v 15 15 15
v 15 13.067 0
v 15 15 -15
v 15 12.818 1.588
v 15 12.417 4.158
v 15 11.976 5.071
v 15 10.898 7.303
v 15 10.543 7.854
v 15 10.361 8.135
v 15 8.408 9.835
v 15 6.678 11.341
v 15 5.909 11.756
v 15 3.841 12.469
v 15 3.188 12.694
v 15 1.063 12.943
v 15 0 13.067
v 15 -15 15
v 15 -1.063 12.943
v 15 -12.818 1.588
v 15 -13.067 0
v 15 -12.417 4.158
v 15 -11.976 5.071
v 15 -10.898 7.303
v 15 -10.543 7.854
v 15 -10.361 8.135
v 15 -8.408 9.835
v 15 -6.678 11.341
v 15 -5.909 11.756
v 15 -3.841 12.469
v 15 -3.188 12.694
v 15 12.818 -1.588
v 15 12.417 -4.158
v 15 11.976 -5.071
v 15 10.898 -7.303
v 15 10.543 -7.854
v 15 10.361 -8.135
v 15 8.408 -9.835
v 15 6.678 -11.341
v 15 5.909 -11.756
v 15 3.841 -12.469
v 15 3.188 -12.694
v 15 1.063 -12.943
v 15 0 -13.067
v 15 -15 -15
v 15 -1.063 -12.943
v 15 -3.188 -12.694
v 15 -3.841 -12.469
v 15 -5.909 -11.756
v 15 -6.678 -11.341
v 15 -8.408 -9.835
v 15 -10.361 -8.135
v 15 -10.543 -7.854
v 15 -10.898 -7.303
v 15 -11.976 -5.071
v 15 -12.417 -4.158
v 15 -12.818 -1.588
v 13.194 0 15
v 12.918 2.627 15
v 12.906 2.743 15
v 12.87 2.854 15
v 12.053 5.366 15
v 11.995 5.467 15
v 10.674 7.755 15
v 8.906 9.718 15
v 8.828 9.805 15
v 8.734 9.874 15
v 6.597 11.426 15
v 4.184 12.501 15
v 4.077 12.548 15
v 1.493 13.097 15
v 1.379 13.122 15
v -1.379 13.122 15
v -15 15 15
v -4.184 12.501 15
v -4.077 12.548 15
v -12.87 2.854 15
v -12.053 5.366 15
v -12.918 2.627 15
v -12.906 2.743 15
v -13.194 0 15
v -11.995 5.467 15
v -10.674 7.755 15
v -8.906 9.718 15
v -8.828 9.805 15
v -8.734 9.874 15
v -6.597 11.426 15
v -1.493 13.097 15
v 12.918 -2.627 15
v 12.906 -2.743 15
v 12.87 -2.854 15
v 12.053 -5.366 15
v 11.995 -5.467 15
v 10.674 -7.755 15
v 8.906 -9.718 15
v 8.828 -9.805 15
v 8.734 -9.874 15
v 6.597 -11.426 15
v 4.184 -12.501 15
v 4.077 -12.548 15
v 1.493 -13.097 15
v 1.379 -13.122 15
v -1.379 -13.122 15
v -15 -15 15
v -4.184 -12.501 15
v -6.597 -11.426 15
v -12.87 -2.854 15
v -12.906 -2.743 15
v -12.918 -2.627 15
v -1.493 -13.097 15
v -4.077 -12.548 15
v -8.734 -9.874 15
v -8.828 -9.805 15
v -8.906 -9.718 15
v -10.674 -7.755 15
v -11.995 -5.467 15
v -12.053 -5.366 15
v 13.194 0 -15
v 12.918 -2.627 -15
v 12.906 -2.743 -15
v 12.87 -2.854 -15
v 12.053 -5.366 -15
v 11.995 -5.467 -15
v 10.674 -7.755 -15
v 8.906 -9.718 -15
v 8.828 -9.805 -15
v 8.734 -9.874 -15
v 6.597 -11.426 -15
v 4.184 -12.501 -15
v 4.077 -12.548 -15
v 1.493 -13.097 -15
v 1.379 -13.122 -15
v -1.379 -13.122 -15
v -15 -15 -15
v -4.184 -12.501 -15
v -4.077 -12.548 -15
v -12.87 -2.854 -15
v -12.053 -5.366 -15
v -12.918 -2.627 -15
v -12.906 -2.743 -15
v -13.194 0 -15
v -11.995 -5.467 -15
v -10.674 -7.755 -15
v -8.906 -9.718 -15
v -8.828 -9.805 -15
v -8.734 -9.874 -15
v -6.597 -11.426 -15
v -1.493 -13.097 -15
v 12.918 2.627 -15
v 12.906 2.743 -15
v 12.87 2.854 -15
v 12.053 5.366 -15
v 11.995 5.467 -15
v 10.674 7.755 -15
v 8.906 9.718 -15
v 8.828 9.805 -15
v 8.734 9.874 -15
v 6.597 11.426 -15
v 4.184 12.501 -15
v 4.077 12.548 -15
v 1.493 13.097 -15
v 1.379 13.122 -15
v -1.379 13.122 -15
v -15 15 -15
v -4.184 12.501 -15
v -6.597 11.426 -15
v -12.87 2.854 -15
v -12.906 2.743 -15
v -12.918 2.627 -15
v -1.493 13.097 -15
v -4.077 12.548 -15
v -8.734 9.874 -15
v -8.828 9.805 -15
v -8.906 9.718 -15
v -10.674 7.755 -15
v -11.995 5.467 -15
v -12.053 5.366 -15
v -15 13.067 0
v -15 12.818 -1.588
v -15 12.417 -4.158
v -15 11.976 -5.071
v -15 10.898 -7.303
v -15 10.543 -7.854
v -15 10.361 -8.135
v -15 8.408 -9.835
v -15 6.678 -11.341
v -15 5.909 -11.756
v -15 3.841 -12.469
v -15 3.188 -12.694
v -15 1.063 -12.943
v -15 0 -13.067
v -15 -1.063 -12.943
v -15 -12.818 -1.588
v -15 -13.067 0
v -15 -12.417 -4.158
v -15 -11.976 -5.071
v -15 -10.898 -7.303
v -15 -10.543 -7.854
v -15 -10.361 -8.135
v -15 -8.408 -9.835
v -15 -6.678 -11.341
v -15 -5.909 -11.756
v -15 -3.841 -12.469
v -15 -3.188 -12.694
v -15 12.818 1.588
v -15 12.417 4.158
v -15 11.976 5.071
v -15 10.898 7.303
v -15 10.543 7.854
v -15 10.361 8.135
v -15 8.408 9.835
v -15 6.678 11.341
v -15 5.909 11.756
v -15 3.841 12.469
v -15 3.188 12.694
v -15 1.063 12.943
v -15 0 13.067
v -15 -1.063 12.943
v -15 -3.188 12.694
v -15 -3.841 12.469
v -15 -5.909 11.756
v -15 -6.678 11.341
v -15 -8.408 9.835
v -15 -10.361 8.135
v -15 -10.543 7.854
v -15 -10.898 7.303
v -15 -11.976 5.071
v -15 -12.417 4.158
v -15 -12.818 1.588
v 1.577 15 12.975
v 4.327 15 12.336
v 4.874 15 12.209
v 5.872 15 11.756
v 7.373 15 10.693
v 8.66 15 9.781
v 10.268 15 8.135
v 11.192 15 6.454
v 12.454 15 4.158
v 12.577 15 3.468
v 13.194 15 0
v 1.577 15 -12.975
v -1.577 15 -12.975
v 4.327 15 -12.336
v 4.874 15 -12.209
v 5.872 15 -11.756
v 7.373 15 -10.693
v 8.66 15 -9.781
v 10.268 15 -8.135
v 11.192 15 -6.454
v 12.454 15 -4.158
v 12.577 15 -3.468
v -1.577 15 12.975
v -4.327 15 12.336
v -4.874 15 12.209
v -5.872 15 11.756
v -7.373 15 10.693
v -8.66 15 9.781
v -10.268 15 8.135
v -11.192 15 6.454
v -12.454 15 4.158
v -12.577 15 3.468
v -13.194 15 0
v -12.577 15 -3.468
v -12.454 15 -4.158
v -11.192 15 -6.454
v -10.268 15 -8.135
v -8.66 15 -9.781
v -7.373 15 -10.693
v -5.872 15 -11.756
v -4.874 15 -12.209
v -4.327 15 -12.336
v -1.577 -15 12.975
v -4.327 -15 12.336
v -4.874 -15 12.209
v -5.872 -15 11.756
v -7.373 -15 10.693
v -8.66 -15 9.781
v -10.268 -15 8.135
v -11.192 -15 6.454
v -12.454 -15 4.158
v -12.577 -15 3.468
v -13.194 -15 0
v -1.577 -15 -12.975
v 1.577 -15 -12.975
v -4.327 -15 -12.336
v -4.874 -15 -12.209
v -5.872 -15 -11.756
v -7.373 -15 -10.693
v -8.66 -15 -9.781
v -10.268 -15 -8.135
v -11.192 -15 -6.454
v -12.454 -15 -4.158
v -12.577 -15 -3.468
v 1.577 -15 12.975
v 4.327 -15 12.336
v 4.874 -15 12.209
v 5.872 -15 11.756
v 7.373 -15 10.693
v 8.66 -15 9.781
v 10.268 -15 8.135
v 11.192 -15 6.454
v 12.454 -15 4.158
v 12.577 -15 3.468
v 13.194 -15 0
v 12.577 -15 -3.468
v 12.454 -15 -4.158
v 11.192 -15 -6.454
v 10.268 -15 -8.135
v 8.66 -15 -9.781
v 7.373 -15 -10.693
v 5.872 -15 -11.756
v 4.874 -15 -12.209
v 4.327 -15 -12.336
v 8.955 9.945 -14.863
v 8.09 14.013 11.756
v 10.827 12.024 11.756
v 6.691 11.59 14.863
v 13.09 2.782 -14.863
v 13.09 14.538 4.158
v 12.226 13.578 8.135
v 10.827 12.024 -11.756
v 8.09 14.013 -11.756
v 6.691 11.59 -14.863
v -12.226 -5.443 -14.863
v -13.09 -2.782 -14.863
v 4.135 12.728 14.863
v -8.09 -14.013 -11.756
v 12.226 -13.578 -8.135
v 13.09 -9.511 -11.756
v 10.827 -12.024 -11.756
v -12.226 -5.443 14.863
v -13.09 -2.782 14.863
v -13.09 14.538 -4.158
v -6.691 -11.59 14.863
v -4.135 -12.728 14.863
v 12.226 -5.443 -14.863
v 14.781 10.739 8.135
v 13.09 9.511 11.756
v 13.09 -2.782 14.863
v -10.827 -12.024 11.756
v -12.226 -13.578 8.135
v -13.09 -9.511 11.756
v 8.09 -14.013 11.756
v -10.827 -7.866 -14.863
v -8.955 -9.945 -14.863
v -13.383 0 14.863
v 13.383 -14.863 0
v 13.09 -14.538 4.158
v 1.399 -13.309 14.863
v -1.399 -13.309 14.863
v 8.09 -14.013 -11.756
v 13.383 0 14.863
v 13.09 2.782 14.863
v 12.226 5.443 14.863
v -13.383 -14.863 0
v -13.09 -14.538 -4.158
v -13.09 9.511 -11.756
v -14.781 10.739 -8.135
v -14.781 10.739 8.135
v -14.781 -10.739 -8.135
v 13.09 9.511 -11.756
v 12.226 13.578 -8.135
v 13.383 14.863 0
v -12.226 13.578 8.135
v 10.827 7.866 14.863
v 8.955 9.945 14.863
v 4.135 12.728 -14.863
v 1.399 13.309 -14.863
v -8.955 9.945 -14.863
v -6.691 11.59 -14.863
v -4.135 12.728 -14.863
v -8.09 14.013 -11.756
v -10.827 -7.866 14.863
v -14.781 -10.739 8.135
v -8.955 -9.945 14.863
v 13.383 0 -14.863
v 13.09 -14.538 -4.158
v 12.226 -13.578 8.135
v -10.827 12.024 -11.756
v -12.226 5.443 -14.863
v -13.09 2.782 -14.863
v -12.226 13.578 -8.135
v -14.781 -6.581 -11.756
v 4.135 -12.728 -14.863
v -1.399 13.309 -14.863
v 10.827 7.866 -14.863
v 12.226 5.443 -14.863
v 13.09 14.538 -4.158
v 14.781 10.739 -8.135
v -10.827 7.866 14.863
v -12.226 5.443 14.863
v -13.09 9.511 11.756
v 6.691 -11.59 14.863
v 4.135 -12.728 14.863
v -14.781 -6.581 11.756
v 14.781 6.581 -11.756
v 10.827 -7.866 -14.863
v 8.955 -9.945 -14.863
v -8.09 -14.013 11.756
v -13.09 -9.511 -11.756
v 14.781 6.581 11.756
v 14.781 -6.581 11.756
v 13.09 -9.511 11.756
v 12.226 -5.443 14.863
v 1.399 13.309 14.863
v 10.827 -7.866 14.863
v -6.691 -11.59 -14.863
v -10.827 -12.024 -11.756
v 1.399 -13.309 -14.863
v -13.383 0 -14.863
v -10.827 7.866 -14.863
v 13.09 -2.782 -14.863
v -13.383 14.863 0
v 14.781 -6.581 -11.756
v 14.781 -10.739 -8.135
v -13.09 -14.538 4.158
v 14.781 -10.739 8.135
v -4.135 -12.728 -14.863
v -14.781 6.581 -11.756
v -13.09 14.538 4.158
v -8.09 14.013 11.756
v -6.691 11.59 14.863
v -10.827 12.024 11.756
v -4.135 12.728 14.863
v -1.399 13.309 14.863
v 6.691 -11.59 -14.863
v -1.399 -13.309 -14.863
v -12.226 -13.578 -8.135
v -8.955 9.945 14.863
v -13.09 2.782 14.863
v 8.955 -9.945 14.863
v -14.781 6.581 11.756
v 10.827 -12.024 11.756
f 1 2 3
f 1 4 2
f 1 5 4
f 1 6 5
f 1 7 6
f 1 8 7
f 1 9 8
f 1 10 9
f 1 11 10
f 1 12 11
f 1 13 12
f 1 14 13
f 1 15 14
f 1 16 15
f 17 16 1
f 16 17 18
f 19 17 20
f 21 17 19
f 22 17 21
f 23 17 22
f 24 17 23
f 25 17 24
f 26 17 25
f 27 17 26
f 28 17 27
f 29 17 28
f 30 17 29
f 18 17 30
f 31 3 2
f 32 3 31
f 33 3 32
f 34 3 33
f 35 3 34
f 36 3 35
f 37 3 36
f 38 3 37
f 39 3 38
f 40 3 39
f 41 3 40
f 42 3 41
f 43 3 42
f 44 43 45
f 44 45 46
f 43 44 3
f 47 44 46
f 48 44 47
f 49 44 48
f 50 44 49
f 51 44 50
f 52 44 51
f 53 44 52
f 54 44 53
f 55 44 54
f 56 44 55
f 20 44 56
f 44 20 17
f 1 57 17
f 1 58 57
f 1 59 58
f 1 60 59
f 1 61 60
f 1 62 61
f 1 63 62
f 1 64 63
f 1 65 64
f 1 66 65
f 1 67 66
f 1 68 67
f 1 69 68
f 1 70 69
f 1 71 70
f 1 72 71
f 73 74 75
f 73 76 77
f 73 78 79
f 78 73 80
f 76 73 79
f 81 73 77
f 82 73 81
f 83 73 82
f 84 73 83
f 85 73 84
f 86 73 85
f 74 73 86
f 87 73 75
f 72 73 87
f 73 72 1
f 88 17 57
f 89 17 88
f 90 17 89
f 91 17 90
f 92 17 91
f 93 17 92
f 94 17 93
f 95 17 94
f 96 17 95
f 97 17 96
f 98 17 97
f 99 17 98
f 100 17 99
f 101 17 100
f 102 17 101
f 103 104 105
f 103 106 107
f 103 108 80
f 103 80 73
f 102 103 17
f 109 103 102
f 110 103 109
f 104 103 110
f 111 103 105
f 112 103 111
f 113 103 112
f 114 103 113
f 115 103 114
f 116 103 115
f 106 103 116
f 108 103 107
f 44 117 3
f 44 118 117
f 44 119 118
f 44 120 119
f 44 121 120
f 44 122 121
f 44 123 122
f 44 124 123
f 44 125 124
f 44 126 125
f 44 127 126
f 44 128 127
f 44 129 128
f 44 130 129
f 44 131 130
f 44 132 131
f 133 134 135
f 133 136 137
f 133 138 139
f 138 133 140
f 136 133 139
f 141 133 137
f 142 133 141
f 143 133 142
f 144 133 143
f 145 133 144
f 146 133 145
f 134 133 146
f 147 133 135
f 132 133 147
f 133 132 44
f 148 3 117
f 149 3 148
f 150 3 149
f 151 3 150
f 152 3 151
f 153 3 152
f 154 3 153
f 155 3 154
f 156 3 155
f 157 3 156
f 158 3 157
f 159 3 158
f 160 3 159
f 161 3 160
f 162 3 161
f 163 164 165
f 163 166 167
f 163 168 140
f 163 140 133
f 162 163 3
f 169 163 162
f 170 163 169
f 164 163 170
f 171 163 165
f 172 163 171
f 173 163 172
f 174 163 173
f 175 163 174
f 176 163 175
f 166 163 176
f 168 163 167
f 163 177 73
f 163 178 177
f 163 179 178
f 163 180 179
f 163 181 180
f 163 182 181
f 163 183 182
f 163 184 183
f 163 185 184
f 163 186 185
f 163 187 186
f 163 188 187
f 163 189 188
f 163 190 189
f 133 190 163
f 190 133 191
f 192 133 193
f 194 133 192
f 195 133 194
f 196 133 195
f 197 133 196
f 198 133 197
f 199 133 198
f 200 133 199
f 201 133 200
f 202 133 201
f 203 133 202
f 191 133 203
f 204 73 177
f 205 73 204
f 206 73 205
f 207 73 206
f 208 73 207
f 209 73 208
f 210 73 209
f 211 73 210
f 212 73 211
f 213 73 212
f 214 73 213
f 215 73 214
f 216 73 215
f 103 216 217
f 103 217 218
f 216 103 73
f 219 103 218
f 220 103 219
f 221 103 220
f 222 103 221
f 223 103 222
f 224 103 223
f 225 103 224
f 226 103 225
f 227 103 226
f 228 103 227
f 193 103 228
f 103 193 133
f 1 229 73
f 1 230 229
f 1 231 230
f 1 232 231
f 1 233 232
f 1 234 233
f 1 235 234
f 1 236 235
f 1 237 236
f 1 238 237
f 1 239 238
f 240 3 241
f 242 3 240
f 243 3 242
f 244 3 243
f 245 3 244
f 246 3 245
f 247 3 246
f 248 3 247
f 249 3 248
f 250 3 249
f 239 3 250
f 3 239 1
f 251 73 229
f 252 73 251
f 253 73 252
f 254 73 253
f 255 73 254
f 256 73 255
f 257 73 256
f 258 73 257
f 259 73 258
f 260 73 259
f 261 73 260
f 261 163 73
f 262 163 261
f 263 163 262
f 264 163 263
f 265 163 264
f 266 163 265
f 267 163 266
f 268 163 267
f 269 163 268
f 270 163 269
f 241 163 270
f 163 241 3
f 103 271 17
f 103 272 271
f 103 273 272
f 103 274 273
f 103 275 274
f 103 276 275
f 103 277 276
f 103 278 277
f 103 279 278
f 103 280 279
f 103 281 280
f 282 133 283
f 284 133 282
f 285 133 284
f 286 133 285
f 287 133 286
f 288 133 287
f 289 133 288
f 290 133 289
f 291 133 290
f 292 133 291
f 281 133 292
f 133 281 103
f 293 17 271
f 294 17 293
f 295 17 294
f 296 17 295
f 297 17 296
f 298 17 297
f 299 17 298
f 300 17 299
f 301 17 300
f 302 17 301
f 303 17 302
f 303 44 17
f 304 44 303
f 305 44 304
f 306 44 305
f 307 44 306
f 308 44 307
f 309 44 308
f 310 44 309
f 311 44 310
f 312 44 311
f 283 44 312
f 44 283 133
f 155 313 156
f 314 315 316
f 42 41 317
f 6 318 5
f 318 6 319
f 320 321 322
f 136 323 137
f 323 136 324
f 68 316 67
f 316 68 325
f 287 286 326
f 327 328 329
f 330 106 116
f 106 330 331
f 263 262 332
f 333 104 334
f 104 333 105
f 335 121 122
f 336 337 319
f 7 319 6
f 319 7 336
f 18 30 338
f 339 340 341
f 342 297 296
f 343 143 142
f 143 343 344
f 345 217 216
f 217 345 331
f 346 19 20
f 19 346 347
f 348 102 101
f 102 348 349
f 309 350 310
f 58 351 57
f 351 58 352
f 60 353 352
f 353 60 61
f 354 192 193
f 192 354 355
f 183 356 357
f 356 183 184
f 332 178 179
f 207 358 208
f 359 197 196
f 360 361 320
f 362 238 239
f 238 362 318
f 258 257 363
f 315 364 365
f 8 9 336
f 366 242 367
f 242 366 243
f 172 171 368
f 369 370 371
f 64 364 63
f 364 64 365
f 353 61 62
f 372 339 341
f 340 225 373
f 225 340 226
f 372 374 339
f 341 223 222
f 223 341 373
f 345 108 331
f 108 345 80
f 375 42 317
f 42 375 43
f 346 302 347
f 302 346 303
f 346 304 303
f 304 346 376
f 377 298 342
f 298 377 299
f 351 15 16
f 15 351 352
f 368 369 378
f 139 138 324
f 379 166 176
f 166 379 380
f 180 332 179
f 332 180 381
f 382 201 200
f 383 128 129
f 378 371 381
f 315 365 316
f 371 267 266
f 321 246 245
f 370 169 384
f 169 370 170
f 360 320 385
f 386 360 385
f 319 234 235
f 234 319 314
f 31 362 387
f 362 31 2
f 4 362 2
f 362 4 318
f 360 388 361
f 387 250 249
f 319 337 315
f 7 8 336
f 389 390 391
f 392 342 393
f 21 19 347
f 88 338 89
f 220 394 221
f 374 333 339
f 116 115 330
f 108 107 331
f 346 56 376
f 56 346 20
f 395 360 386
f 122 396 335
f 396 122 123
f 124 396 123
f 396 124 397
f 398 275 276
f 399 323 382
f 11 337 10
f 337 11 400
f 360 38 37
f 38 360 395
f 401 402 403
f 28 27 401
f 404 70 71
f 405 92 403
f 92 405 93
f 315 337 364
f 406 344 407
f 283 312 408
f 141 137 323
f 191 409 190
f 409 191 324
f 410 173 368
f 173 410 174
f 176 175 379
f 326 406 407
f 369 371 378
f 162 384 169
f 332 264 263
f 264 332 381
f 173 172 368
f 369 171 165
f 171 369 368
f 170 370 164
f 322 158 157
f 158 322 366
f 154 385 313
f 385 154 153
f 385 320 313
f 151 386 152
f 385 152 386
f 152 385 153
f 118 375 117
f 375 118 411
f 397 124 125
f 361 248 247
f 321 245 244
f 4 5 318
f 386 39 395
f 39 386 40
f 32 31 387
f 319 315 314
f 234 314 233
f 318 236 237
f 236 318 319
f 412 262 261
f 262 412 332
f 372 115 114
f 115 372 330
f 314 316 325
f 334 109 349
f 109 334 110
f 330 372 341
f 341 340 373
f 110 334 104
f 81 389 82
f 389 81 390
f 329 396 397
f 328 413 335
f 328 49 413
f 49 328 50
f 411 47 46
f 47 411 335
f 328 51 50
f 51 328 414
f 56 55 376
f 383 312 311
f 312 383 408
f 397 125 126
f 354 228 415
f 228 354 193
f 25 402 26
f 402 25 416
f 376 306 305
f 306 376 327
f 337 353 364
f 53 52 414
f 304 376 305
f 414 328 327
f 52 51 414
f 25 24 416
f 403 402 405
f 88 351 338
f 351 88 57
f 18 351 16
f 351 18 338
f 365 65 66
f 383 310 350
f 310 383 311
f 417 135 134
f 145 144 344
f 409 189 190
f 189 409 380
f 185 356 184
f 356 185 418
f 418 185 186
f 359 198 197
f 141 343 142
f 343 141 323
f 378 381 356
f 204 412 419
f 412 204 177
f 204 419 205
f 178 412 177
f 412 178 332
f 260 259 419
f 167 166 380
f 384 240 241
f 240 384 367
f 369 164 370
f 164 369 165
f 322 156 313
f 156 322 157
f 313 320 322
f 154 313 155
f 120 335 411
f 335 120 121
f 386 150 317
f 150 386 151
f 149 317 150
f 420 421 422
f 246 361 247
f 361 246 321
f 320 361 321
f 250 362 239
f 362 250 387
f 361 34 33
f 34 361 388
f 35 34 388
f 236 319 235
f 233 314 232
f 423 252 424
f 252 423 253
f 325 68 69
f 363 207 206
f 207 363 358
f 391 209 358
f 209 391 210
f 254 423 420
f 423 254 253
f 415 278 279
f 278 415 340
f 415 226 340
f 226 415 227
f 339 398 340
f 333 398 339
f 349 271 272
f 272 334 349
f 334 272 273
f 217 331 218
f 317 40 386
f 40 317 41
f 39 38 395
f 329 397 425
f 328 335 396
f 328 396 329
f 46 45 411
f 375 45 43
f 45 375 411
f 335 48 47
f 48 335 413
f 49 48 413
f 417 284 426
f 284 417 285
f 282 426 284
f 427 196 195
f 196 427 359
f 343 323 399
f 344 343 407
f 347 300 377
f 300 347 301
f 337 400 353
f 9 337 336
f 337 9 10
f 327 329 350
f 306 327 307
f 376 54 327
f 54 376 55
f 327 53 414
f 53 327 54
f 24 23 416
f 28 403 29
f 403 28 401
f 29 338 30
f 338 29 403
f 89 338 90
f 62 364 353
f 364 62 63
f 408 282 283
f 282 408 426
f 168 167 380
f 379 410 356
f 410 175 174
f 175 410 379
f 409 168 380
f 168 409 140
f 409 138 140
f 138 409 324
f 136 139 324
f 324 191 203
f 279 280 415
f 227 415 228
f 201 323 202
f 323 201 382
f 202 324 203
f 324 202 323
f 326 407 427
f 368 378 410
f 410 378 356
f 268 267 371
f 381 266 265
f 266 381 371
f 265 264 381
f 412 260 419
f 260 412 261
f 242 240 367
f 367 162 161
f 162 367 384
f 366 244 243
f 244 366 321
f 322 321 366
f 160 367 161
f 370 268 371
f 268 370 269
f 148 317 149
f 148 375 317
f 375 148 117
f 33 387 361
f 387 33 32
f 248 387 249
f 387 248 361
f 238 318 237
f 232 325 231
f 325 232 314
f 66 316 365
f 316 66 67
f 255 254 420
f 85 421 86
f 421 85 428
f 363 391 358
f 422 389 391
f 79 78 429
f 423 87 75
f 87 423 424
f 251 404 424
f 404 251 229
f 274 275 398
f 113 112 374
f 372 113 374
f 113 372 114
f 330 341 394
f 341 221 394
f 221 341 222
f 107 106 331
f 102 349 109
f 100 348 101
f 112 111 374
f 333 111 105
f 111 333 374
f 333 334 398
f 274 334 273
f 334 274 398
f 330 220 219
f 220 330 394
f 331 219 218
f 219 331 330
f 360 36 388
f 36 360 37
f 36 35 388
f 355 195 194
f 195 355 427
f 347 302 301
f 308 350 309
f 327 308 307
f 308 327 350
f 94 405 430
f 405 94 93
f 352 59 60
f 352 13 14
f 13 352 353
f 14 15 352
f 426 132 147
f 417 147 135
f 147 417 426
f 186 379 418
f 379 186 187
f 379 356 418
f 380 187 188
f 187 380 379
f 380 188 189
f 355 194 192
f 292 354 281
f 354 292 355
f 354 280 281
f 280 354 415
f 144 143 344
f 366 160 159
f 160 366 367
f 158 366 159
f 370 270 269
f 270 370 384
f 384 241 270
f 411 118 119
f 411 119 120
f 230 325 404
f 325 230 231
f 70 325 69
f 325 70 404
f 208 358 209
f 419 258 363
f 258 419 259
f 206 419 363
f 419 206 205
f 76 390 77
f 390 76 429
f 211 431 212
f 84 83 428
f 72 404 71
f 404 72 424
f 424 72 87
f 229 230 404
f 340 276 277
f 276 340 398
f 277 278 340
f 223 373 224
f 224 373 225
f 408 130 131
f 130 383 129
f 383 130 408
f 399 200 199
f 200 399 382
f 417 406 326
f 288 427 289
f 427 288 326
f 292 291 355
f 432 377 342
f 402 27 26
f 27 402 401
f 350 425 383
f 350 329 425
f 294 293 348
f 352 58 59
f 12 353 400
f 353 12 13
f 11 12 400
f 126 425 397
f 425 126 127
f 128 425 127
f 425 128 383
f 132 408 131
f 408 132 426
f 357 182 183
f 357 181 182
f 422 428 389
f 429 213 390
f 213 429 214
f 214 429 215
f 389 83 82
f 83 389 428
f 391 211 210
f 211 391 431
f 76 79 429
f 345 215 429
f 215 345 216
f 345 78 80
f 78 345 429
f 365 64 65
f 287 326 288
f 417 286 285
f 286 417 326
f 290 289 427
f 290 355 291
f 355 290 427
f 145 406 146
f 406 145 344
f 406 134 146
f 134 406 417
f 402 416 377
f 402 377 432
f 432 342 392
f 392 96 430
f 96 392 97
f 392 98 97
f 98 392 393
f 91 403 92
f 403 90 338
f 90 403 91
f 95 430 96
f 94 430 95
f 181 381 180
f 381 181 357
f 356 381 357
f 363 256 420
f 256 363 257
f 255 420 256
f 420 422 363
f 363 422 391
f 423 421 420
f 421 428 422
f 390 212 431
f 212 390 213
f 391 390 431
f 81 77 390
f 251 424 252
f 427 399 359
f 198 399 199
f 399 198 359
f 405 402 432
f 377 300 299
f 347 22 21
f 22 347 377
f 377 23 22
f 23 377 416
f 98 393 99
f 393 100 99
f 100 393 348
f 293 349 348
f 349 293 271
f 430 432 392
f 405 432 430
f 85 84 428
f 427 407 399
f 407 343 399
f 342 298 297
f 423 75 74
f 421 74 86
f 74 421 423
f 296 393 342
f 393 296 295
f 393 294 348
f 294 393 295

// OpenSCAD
/*
 *  OpenSCAD (www.openscad.org)
 *  Copyright (C) 2009-2011 Clifford Wolf <clifford@clifford.at> and
 *                          Marius Kintel <marius@kintel.net>
 *
 *  This program is free software; you can redistribute it and/or modify
 *  it under the terms of the GNU General Public License as published by
 *  the Free Software Foundation; either version 2 of the License, or
 *  (at your option) any later version.
 *
 *  This program is distributed in the hope that it will be useful,
 *  but WITHOUT ANY WARRANTY; without even the implied warranty of
 *  MERCHANTABILITY or FITNESS FOR A PARTICULAR PURPOSE.  See the
 *  GNU General Public License for more details.
 *
 *  You should have received a copy of the GNU General Public License
 *  along with this program; if not, write to the Free Software
 *  Foundation, Inc., 59 Temple Place, Suite 330, Boston, MA  02111-1307  USA
 *
 */

module example004()
{
	difference() {
		cube(30, center = true);
		sphere(20);
	}
}

example004();
